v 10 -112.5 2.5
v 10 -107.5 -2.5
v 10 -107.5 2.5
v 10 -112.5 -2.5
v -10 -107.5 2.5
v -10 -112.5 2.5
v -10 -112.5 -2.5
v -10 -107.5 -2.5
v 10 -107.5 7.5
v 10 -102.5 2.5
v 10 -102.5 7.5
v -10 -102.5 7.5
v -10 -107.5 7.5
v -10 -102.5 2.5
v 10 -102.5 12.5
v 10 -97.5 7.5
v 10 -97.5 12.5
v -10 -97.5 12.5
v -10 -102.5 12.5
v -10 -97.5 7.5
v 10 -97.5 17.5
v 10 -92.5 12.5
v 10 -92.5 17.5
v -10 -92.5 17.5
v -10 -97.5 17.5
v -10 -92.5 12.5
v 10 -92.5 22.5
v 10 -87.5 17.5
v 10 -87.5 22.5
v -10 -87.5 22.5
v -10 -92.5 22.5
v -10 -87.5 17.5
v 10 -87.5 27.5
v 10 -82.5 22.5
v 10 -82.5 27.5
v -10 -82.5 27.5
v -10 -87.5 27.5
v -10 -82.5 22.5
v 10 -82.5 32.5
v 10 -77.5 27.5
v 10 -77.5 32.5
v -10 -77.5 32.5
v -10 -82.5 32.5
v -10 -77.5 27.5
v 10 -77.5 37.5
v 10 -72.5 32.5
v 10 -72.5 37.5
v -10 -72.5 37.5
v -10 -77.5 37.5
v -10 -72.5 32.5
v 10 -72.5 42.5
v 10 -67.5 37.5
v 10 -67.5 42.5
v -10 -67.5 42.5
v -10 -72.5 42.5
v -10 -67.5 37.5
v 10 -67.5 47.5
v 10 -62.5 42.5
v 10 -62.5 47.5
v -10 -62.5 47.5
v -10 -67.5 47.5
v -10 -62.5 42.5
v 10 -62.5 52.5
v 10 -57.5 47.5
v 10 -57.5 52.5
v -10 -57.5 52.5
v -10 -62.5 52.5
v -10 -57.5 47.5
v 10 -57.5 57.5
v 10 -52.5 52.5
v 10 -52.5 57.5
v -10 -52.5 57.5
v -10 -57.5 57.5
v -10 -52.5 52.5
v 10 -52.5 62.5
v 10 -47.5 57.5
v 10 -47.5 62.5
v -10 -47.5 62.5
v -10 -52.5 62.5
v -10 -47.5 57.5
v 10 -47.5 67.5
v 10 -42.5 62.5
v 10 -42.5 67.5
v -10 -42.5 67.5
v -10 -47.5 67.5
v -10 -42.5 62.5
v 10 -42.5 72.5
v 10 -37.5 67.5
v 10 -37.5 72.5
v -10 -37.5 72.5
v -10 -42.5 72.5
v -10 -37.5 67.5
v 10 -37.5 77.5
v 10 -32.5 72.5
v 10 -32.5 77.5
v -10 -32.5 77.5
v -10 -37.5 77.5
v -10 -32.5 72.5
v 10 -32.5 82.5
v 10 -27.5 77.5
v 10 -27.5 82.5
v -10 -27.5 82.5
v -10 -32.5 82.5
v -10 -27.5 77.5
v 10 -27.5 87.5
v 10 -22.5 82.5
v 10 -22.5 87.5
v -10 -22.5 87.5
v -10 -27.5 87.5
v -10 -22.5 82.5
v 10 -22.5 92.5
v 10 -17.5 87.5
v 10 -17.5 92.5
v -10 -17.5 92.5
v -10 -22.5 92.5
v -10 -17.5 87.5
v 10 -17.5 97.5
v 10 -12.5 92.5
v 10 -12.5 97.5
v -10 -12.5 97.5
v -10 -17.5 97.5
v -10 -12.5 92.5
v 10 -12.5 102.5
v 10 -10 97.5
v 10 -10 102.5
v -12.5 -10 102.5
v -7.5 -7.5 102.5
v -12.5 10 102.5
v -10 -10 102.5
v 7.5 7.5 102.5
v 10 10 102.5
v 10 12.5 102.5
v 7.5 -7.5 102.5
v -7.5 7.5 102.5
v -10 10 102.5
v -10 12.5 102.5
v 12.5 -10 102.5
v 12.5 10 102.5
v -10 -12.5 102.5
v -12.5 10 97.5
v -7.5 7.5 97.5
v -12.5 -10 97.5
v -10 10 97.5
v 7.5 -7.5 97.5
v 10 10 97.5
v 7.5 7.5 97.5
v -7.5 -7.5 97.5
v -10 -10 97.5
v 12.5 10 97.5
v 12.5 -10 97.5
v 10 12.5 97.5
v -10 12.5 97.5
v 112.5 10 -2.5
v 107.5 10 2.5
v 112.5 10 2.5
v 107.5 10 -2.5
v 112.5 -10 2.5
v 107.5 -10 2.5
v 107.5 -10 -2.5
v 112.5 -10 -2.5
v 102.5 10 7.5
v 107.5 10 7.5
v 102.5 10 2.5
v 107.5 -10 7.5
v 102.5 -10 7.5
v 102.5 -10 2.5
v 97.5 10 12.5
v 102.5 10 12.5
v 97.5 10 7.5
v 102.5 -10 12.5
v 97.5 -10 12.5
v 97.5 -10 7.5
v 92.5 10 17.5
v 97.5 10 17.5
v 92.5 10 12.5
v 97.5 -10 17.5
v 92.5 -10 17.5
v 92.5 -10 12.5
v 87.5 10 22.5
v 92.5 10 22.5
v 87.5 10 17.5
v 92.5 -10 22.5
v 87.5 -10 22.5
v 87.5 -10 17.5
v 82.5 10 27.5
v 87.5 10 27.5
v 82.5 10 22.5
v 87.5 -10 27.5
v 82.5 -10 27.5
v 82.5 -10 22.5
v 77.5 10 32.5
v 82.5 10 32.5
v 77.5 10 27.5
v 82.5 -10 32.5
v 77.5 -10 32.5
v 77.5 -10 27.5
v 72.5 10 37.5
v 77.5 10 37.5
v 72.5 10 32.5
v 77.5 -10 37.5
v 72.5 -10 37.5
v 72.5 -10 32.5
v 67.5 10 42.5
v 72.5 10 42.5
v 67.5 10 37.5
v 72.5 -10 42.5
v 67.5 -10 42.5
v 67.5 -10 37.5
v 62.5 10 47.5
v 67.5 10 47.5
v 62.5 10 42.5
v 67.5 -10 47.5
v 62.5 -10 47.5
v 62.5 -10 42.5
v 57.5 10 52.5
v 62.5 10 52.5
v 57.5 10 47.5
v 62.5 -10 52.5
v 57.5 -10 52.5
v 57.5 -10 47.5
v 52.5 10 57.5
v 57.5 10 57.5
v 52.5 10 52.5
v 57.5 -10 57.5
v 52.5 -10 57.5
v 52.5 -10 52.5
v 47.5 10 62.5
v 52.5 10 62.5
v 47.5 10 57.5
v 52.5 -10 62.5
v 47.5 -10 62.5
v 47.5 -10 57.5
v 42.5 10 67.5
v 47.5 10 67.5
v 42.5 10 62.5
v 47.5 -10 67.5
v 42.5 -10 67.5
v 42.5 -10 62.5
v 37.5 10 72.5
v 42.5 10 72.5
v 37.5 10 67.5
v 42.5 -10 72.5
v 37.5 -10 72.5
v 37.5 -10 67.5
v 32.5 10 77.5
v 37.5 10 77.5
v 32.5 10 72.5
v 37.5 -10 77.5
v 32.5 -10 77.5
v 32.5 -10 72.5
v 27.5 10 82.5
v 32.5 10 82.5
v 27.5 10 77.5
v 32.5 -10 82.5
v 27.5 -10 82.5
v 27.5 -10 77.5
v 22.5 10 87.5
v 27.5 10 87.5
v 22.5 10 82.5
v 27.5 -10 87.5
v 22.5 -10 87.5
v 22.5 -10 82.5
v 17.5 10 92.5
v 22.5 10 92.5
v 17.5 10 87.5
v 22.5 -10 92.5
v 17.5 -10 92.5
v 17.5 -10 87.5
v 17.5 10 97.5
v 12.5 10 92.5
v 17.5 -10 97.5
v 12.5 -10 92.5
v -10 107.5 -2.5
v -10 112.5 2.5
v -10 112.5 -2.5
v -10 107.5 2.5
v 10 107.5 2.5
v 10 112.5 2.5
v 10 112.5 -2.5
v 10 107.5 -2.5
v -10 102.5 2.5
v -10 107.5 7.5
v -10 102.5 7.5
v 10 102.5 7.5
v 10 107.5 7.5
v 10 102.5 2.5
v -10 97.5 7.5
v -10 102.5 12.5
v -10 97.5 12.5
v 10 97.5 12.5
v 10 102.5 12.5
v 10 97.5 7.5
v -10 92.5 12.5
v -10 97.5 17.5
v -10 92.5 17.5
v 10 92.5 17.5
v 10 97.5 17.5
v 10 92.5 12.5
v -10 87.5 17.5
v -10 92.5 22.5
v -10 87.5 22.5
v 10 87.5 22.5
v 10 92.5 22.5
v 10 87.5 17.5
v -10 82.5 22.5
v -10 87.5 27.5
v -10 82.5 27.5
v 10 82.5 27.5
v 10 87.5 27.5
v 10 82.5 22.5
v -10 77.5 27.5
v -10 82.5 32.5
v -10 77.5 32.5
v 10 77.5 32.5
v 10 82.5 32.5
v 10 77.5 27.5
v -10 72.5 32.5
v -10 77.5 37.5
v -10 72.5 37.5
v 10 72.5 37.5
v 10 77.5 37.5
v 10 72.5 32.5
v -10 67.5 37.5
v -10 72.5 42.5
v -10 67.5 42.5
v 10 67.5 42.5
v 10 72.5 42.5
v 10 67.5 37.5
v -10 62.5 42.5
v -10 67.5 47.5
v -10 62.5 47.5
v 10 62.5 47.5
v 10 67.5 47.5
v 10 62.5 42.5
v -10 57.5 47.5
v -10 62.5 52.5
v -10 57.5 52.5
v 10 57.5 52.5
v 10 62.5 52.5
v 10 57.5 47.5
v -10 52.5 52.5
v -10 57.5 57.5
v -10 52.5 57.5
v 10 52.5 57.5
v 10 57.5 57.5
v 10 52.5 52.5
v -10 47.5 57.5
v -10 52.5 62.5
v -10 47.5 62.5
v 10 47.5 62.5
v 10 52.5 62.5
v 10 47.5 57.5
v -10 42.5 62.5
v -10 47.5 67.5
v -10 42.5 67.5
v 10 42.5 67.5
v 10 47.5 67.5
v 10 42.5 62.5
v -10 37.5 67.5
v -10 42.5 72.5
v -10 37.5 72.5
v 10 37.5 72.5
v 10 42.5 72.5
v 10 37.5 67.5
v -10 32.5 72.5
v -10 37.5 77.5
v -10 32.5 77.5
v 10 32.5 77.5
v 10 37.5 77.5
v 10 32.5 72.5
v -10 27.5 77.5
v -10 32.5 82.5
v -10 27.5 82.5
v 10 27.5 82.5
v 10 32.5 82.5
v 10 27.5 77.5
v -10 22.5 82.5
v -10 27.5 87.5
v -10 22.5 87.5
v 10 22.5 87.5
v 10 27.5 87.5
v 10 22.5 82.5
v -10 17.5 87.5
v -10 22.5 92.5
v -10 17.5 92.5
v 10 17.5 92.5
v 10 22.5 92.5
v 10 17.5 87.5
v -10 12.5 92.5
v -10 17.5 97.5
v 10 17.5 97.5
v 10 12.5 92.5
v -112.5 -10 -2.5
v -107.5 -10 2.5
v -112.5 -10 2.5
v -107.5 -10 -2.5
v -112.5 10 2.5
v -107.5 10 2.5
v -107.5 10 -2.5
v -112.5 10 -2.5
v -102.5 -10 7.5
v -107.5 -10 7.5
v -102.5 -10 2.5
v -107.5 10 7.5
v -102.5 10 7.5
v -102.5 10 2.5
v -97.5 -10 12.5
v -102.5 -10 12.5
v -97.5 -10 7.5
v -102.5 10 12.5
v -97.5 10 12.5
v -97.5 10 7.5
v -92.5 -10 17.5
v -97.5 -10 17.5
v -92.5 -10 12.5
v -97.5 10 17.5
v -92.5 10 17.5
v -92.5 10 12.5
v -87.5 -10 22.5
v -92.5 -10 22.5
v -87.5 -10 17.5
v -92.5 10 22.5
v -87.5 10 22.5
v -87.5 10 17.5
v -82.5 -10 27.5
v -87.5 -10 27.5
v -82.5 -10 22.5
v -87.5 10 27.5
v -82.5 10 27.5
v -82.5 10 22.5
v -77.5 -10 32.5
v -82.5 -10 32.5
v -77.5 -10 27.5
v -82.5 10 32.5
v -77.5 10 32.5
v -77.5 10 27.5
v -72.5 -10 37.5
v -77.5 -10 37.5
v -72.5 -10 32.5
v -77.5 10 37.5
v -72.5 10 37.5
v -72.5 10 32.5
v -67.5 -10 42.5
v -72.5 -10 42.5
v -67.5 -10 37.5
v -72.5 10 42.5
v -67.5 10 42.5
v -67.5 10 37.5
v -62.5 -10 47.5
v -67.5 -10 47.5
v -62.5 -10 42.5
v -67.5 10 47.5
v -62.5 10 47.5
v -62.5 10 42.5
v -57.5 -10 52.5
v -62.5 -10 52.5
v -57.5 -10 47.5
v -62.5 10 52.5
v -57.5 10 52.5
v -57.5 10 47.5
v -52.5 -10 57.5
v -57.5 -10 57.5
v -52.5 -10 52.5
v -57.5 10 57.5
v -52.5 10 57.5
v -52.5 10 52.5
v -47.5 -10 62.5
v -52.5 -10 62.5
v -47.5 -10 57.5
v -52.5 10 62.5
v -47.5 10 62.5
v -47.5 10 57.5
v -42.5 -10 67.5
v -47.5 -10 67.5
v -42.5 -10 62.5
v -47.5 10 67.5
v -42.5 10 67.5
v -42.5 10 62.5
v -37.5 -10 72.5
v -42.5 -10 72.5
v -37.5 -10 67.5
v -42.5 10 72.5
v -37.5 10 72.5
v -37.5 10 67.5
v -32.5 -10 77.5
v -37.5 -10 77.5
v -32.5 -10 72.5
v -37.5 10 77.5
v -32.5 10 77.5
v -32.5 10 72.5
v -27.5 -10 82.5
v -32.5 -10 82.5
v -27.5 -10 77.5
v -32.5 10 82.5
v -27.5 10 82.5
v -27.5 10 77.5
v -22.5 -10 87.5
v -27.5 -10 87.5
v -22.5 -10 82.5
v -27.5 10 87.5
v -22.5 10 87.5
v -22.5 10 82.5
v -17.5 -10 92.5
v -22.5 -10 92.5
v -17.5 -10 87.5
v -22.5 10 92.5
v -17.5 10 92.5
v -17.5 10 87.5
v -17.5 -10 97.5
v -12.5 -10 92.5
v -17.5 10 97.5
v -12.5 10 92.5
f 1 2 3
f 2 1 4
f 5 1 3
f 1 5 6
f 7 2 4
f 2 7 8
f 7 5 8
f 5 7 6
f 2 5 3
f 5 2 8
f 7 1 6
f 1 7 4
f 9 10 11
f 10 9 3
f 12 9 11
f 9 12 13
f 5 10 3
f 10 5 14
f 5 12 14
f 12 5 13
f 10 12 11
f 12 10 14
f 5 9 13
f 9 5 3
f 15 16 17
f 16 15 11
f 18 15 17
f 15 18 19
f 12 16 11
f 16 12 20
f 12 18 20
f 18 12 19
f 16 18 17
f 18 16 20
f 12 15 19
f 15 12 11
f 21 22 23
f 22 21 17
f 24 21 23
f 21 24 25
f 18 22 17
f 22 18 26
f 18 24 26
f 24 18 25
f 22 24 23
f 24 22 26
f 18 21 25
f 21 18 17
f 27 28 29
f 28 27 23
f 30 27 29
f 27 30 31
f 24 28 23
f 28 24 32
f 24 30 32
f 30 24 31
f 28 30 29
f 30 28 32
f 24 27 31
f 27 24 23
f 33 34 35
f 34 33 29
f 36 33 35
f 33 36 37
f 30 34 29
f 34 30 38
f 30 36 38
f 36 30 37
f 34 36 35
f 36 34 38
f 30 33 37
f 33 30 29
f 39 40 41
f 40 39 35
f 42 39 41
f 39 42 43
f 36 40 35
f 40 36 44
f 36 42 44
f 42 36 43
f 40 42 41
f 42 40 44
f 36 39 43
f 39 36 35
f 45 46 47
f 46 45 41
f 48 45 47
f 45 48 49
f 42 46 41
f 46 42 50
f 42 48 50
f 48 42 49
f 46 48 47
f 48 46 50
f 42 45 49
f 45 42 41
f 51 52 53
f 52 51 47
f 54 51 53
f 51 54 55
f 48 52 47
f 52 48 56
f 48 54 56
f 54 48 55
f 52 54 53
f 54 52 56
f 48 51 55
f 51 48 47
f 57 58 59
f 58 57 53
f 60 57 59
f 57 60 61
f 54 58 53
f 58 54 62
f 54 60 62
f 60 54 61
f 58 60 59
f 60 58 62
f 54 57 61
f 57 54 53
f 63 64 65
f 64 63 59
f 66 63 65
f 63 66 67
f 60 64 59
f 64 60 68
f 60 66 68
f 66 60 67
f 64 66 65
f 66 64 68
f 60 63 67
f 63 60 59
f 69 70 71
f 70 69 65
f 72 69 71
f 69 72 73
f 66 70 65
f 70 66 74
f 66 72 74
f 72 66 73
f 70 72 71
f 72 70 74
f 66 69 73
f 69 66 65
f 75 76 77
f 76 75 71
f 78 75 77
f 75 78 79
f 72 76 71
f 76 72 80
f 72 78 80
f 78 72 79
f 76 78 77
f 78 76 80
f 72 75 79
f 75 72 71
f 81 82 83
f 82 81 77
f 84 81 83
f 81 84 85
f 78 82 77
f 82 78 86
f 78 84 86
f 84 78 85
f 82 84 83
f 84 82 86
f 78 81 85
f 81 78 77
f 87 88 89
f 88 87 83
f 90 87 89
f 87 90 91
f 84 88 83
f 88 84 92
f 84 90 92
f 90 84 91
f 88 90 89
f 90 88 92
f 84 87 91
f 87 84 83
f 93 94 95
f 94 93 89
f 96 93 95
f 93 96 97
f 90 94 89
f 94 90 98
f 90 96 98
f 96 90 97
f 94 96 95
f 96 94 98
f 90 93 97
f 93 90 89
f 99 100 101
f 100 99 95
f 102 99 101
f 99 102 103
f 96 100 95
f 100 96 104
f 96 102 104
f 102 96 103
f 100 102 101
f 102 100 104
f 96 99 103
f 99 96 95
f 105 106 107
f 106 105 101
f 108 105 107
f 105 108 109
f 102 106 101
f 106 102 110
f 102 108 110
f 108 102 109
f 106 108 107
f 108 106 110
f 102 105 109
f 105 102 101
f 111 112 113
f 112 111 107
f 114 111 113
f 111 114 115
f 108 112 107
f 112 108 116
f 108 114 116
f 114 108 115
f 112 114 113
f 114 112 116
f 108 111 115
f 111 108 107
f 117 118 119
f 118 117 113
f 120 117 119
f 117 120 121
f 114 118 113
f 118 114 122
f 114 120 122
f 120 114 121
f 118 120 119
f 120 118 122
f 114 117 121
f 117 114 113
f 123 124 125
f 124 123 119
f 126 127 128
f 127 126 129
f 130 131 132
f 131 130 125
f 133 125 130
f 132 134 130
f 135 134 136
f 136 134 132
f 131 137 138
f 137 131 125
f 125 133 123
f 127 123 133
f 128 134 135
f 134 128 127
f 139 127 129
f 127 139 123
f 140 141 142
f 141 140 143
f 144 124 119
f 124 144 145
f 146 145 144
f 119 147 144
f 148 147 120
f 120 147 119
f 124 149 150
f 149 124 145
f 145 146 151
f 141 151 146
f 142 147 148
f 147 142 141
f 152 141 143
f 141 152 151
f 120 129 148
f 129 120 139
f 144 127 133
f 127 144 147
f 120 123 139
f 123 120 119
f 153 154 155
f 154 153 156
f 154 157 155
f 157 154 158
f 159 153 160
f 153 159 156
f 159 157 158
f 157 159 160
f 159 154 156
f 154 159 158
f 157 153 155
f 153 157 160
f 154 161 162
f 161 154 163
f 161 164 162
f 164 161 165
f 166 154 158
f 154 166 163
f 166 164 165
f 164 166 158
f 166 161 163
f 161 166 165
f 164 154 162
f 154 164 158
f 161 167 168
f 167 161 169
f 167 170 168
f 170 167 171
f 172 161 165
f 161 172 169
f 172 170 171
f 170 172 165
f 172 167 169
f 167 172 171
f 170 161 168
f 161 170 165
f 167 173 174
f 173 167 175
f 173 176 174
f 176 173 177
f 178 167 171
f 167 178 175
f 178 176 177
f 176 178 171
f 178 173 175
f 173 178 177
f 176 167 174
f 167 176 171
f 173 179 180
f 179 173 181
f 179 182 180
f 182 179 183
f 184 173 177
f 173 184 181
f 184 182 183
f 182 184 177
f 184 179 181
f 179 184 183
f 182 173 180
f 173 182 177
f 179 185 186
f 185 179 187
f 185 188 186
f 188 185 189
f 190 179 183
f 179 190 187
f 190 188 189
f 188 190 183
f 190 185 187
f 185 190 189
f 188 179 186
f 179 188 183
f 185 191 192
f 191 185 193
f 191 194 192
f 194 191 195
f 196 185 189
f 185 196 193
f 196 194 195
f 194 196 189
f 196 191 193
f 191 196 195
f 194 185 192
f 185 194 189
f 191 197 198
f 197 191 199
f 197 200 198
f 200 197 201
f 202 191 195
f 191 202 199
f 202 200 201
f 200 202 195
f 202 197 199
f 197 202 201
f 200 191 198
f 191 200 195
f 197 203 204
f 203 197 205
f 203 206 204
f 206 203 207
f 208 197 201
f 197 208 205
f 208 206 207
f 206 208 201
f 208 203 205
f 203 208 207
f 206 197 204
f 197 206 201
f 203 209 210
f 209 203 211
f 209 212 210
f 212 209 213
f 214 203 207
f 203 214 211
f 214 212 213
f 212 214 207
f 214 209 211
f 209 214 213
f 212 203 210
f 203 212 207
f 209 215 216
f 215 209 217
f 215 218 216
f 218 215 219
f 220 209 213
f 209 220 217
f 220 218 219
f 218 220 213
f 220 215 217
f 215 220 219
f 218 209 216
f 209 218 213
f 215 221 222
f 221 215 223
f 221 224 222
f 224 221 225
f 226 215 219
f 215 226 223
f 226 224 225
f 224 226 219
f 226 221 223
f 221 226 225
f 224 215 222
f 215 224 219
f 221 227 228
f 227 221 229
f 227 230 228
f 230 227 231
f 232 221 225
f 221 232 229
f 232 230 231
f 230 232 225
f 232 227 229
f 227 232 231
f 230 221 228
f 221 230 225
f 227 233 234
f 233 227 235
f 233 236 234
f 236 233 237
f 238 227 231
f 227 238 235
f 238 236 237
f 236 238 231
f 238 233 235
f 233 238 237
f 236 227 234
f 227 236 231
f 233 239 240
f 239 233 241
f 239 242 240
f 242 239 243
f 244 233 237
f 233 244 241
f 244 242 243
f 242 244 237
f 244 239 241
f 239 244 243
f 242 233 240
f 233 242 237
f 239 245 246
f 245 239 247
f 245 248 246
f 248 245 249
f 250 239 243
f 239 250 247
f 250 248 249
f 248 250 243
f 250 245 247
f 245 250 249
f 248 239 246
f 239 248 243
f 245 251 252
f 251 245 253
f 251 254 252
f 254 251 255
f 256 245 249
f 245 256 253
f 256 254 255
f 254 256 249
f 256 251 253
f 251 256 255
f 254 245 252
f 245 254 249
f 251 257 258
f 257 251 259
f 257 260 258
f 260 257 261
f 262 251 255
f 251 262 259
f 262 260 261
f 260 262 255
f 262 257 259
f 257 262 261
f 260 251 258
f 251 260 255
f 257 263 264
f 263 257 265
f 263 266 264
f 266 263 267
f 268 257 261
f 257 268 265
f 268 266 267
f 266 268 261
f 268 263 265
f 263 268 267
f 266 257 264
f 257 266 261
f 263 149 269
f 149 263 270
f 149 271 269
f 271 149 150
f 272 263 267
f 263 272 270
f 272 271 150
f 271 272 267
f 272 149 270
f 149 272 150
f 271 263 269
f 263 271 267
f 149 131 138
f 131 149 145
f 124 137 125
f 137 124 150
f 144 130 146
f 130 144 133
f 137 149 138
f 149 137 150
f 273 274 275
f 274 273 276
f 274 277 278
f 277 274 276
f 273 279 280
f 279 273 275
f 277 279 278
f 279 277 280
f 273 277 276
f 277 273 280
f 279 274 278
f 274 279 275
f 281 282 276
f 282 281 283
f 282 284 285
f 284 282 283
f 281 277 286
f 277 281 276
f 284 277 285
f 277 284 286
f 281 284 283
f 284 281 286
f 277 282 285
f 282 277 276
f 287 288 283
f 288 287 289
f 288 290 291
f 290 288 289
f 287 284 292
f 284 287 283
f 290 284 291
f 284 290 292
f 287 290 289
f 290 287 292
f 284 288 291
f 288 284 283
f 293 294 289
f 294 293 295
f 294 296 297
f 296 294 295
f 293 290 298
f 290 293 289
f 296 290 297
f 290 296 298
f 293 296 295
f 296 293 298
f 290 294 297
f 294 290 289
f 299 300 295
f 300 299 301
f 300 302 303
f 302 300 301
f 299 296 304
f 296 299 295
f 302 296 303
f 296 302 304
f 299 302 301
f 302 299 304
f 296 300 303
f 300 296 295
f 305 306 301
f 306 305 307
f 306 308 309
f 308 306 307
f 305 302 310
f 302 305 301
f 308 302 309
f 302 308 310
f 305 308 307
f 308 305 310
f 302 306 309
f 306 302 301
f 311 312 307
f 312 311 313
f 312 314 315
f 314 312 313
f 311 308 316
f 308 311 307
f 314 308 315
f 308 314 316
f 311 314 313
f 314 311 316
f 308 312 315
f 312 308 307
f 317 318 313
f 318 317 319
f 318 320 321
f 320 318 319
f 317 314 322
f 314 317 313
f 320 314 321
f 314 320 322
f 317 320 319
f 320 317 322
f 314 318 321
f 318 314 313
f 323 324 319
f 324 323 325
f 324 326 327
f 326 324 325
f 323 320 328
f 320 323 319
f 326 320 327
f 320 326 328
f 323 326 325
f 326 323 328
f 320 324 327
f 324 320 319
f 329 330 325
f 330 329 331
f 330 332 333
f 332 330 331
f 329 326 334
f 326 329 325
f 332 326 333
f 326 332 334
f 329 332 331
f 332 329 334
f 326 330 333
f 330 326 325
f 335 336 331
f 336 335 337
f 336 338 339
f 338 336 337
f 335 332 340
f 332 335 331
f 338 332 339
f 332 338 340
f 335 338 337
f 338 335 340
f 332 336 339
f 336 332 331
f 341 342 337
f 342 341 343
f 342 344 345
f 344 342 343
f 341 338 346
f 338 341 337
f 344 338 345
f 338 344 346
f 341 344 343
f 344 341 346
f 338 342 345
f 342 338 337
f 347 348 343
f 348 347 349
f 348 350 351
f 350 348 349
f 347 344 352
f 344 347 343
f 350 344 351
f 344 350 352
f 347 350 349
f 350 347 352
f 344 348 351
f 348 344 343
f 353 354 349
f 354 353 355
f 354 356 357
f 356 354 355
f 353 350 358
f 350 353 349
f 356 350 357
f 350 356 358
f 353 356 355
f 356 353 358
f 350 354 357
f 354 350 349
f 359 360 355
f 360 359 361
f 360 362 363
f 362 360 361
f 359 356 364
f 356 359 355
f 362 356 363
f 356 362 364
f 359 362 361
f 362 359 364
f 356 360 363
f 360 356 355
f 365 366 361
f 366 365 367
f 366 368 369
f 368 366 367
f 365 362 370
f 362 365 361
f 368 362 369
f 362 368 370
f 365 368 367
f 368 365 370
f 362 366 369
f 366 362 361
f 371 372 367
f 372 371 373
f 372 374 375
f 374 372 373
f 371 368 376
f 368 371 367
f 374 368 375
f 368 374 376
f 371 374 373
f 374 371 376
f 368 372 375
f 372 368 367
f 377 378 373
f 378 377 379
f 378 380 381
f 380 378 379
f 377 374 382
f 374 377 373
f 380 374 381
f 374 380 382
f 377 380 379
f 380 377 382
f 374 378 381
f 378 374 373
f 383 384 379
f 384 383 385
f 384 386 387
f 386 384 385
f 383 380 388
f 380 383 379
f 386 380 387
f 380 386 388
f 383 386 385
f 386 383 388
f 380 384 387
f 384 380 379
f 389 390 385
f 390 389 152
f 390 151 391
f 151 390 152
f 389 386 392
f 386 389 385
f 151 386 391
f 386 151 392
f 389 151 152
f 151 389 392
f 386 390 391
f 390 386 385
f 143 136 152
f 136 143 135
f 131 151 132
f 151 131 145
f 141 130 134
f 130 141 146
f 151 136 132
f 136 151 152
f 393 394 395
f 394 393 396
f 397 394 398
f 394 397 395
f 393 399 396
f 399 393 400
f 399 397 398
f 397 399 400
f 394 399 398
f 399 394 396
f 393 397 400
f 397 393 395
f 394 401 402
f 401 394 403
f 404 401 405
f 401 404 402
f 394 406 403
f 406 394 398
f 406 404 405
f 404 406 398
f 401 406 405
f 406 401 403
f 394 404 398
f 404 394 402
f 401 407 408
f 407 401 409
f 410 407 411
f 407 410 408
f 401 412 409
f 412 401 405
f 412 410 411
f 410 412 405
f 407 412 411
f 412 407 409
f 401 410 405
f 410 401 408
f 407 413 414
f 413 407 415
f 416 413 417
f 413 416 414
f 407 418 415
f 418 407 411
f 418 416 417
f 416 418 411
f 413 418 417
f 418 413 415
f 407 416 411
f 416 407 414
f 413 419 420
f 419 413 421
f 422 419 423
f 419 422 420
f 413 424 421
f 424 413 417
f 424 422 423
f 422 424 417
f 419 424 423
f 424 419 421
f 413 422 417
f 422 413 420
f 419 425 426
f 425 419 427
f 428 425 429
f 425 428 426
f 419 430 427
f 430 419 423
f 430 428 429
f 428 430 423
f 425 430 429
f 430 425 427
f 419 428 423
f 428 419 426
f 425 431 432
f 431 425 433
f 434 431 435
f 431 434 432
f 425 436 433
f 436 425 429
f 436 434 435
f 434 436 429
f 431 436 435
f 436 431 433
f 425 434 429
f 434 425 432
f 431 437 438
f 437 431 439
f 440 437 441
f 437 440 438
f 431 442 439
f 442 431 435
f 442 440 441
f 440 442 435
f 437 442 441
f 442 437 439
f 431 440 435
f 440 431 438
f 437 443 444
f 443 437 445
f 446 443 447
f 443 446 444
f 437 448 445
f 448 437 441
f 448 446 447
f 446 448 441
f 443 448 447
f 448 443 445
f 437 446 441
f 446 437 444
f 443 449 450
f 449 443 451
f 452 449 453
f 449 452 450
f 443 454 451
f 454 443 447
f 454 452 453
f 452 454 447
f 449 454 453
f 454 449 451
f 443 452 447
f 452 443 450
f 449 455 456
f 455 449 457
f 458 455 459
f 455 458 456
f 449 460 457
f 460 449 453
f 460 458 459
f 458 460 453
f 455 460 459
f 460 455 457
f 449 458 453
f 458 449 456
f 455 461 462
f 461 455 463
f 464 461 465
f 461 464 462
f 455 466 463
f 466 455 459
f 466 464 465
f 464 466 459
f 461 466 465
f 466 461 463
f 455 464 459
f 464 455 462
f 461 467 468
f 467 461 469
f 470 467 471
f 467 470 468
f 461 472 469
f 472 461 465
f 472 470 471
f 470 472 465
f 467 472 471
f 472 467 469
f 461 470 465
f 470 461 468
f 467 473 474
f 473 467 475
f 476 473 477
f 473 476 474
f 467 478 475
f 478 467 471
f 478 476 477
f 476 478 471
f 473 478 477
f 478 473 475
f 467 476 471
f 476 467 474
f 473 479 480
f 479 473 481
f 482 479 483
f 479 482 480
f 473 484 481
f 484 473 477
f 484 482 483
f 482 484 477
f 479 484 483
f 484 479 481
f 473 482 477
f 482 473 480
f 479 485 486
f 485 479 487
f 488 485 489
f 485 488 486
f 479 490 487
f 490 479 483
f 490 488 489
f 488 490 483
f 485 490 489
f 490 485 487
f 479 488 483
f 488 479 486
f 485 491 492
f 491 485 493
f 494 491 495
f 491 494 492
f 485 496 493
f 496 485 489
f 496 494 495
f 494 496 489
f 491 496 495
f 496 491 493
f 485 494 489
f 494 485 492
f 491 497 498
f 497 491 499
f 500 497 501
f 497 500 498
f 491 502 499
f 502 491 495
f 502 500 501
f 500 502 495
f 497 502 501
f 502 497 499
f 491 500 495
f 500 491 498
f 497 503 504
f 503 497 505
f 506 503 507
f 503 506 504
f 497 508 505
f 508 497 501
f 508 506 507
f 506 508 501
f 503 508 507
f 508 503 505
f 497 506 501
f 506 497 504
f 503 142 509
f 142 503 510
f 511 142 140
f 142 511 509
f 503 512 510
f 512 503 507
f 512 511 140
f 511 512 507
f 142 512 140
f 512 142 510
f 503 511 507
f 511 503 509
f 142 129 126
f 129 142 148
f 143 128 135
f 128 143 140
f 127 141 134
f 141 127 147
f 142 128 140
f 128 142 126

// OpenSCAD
for(s1=[0:90:270]){
    rotate([0,0,s1]) translate([0, -110, 0])
    for(s2=[0:5:100]){
     translate([0,s2,s2]) cube([20,5,5], center=true);
    }
}
